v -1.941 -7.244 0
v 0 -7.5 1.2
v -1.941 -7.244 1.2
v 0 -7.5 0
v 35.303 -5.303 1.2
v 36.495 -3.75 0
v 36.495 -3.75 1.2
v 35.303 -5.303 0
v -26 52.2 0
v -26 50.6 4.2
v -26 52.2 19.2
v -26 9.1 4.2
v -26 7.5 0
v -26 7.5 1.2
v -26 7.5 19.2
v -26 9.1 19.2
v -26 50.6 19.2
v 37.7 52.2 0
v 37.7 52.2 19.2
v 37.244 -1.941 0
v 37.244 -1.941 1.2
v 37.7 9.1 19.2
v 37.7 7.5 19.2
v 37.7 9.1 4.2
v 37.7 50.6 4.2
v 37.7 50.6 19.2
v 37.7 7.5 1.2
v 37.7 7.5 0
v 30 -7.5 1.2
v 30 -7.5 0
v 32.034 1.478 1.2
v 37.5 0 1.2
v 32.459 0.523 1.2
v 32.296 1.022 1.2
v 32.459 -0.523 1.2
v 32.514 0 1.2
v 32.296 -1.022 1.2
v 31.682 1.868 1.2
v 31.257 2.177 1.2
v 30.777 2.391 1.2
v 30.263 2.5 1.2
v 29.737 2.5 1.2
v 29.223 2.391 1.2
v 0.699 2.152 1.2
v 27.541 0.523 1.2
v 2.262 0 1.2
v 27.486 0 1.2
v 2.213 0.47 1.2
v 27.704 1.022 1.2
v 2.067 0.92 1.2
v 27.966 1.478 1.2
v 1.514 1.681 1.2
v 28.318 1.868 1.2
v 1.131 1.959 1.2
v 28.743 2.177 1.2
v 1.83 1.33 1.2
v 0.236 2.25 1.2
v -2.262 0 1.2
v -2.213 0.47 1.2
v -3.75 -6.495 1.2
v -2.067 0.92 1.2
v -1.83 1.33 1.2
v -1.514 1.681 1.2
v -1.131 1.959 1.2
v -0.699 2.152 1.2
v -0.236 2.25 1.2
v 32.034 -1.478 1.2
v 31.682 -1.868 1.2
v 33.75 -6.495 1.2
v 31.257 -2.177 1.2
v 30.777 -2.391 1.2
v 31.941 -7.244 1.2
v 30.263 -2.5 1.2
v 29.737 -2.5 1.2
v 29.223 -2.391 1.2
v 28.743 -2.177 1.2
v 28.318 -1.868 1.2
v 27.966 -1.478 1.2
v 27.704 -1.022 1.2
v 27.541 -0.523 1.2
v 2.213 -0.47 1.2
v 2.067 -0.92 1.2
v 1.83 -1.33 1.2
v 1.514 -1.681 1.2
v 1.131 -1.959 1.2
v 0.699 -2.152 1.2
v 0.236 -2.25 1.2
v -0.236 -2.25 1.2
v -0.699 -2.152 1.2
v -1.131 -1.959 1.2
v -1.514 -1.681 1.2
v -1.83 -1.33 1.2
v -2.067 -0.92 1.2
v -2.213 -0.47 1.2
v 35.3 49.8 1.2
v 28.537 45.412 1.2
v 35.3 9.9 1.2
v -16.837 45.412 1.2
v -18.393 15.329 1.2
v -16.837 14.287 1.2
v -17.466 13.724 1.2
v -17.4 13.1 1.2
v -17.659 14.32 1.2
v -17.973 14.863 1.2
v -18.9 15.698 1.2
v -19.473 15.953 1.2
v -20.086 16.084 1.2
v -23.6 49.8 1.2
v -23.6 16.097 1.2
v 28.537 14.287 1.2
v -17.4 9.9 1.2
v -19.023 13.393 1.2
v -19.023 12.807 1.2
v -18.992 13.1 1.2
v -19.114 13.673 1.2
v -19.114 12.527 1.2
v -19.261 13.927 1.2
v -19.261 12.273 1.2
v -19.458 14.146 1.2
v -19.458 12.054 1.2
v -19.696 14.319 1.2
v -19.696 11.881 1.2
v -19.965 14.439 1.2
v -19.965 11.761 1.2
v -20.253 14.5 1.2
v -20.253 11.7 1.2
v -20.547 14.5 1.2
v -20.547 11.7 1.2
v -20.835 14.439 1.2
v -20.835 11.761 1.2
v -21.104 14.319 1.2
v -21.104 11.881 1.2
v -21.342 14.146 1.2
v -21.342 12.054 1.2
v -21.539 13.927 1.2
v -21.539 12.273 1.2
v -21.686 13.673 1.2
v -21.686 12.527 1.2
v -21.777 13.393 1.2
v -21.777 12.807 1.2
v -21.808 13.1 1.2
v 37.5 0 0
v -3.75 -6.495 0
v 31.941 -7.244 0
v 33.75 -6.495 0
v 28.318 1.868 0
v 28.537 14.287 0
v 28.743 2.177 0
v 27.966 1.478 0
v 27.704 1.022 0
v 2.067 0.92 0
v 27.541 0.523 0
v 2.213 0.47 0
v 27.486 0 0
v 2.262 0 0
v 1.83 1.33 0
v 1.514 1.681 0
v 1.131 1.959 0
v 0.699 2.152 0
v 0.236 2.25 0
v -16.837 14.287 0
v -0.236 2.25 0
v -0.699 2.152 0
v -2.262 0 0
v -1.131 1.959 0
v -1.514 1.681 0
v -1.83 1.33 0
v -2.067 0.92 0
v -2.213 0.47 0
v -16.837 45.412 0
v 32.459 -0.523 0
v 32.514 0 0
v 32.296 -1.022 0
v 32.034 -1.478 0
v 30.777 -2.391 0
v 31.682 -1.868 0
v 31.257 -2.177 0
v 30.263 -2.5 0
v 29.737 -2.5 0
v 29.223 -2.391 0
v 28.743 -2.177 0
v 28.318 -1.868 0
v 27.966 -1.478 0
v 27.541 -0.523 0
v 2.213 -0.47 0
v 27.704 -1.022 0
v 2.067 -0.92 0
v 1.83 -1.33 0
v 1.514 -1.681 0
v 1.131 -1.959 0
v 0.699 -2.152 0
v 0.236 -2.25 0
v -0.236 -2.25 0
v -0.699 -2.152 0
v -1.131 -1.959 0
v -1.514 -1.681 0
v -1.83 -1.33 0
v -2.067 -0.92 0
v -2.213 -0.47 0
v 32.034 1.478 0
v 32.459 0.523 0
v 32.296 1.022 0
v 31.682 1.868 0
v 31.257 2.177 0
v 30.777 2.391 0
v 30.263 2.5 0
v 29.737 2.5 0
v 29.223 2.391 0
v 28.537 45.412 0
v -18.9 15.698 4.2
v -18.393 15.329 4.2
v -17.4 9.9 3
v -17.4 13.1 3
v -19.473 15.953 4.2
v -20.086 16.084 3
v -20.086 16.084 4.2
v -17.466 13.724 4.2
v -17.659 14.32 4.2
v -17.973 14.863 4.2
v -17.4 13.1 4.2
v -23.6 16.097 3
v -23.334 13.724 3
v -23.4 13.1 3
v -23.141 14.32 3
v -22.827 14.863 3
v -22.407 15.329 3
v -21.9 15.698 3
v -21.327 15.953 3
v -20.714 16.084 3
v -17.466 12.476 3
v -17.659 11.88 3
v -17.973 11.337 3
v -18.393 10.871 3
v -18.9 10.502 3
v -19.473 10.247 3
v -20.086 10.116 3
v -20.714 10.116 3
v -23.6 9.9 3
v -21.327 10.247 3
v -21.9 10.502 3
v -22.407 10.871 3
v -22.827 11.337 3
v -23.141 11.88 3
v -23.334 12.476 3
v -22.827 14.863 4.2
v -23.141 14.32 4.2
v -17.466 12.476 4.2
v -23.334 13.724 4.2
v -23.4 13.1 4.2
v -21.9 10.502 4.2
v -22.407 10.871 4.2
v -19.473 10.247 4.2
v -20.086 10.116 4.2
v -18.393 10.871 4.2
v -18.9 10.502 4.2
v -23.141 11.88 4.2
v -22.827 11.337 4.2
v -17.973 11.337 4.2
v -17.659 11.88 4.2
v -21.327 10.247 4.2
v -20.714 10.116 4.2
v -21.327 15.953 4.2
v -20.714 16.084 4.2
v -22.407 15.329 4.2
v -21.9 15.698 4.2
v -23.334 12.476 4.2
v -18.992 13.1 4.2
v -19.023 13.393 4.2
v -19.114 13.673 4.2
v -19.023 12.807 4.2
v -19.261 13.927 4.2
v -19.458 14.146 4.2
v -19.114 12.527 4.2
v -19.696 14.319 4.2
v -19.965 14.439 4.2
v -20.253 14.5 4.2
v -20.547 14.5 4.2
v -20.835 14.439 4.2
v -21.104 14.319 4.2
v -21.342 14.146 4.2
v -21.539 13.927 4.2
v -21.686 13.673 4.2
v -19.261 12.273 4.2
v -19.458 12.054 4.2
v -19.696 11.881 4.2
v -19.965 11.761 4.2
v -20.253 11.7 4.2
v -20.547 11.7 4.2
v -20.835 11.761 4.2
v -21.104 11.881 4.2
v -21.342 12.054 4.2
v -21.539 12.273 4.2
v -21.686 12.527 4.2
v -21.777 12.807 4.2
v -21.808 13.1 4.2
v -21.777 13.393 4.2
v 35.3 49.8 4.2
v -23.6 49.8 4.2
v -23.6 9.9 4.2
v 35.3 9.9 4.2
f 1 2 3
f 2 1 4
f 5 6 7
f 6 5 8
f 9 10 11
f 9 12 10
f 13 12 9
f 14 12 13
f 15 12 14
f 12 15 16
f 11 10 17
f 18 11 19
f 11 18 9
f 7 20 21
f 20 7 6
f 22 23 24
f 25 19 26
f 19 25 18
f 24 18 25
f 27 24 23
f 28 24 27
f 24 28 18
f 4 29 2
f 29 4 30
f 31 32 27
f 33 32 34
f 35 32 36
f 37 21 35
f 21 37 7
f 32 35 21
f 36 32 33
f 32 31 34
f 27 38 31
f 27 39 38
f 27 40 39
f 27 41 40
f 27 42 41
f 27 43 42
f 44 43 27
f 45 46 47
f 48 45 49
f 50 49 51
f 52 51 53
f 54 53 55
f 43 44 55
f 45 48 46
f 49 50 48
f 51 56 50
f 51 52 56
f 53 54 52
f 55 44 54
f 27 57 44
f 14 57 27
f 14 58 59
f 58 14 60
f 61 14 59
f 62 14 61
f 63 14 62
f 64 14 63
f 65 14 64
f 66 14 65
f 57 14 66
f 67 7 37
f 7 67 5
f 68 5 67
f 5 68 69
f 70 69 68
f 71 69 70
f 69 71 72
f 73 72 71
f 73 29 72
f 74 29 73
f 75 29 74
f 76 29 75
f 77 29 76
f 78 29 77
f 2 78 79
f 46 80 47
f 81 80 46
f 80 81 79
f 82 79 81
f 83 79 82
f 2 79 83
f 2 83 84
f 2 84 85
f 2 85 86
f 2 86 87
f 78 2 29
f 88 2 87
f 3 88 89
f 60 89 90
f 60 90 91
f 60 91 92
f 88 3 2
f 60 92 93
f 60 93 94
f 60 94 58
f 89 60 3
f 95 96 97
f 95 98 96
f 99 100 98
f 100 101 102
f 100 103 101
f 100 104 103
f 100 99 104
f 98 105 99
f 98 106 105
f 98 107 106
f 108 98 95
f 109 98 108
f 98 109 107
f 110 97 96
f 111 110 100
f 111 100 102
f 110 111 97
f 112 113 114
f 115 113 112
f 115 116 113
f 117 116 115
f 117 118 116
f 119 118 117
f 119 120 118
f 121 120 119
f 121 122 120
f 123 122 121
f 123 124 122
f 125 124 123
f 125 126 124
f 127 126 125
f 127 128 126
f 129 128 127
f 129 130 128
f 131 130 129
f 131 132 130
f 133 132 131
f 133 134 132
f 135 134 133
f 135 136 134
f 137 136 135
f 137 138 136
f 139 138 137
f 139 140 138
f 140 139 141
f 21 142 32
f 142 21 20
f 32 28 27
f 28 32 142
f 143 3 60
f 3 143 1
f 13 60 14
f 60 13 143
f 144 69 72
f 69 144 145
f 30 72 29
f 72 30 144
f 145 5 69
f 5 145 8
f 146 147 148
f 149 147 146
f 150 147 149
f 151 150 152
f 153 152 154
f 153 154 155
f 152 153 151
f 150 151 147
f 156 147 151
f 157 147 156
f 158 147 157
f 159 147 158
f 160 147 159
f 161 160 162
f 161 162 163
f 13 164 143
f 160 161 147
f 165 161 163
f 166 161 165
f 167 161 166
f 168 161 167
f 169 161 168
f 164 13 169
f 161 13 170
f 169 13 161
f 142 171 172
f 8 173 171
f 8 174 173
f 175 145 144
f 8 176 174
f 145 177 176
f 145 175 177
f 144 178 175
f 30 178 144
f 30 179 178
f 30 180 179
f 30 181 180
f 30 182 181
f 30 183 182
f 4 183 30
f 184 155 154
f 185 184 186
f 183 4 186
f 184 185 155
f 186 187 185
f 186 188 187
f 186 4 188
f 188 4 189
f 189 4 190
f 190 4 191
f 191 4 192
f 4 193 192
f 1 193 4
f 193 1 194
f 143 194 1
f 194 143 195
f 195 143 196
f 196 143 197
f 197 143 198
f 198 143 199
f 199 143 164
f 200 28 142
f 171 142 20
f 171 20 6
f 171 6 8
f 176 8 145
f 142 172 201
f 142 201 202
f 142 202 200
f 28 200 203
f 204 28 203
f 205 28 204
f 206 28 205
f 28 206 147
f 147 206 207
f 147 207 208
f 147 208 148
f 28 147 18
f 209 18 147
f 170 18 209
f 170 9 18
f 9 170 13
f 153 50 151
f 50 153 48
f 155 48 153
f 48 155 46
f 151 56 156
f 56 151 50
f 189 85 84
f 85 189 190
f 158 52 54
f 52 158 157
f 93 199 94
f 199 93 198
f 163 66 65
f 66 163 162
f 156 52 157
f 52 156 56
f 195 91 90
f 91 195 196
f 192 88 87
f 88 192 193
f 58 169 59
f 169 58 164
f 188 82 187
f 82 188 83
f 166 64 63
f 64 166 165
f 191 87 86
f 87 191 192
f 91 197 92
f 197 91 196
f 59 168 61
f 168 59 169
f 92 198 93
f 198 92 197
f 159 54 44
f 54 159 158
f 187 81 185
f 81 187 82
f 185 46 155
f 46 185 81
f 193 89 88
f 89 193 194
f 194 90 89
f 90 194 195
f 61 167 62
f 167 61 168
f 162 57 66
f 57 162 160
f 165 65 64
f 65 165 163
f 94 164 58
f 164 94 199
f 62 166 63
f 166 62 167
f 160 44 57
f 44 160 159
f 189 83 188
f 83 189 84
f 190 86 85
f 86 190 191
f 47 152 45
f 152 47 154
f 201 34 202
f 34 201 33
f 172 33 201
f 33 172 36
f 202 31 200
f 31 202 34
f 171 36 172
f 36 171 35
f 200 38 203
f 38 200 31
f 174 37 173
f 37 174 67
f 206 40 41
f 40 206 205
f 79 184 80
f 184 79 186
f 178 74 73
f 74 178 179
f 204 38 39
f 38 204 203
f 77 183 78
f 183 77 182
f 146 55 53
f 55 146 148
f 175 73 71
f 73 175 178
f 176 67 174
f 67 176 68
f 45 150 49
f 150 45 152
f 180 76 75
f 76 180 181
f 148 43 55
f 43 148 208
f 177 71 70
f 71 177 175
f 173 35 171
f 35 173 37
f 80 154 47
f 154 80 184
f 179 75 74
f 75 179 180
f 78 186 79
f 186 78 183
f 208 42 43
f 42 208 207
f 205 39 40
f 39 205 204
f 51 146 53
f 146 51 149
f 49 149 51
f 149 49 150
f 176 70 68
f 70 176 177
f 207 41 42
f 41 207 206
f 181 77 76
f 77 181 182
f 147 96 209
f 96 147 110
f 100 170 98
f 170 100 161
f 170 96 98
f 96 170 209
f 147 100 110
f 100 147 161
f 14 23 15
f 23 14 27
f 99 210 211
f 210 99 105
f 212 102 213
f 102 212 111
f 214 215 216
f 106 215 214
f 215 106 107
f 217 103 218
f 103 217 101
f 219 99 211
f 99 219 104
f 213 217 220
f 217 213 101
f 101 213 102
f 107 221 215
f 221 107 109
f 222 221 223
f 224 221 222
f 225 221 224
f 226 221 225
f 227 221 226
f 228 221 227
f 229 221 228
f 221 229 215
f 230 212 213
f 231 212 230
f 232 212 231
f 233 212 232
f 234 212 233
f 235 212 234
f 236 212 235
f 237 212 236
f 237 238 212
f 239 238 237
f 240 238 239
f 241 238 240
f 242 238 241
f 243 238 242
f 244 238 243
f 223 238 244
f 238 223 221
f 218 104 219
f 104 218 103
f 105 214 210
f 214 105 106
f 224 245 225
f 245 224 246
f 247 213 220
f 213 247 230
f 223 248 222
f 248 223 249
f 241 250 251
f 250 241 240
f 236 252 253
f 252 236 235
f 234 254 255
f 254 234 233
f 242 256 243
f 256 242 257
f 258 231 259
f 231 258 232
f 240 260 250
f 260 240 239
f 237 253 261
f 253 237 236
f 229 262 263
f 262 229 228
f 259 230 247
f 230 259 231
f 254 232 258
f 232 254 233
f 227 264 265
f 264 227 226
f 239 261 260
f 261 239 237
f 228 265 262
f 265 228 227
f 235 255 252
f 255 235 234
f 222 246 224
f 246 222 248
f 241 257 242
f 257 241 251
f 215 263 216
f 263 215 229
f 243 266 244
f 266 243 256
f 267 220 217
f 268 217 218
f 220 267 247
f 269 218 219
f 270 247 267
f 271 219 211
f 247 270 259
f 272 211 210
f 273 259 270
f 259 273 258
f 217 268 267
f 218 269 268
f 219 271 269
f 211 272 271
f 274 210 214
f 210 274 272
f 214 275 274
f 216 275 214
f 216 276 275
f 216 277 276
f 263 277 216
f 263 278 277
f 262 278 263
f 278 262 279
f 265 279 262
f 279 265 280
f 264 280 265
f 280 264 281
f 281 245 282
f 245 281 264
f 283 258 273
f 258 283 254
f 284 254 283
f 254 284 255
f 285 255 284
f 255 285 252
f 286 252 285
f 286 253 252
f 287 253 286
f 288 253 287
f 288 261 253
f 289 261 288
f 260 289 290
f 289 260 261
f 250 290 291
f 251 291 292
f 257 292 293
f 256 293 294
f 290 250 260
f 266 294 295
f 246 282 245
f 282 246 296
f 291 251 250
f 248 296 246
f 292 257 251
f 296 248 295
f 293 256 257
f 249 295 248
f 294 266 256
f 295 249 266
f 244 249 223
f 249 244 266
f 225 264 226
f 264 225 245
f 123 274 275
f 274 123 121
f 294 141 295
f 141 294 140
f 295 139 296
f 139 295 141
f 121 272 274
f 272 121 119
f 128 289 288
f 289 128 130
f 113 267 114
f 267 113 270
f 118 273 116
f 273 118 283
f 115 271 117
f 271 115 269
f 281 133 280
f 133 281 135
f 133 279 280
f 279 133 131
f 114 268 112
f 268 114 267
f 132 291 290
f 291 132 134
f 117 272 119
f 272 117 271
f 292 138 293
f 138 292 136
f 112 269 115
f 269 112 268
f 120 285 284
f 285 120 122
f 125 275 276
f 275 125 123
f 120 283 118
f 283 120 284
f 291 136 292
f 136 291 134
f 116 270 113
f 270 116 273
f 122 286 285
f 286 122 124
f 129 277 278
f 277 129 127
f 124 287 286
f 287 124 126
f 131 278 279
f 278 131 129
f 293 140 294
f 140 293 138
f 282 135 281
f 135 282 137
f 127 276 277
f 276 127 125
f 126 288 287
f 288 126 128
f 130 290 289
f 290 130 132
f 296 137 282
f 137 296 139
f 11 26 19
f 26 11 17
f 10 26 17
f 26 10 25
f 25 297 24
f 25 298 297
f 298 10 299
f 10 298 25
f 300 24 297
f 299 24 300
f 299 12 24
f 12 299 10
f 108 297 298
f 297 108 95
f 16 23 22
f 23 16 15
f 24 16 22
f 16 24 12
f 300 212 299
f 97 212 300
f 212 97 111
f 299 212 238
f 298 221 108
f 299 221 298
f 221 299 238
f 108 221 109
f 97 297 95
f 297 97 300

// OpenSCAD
// Common
base_thickness = 1.2;

// Hole 1 (Always created)
hole_1_diameter = 4.5;
hole_1_support_diameter = 15;

// Hole 2 (Created if offsets != 0)
hole_2_diameter = 5;
hole_2_support_diameter = 15;
hole_2_offset_x = 30;
hole_2_offset_y = 0;

// Hole 3 (Created if offsets != 0)
hole_3_diameter = 5;
hole_3_support_diameter = 15;
hole_3_offset_x = 0;
hole_3_offset_y = 0;

// Hole 4 (Created if offsets != 0)
hole_4_diameter = 5;
hole_4_support_diameter = 15;
hole_4_offset_x = 0;
hole_4_offset_y = 0;

// Chip parameters
chip_offset_x = -26;
chip_offset_y = 7.5;
chip_rotation = 0;  // [0:0, 90:90, 180:180, 270:270]
wall_thickness = 1.6;
chip_length = 60.5;
chip_width = 41.5;
chip_height = 18;
riser_height = 3;
riser_width = 0.8;
mount_top = 1;  // [0:No, 1:Yes]
mount_bottom = 1;  // [0:No, 1:Yes]
mount_left = 0;  // [0:No, 1:Yes]
mount_right = 0;  // [0:No, 1:Yes]
riser_top = 1;  // [0:No, 1:Yes]
riser_bottom = 1;  // [0:No, 1:Yes]
riser_left = 1;  // [0:No, 1:Yes]
riser_right = 1;  // [0:No, 1:Yes]
lighten_mount = 1;  // [0:No, 1:Yes]
dual_mount = 0;  // [0:No, 1:Yes]
bottom_left_hole = 1;  // [0:No, 1:Yes]
bl_hole_x = 4;
bl_hole_y = 4;
bl_hole_diameter = 2.8;
bl_hole_thickness = 1.6;


module hole(radius, thickness){
  fn = 30;
  fudge = 1 / cos(180 / fn);
  translate([0, 0, -thickness*0.01]) {
    cylinder(h=thickness * 1.02, r=radius * fudge, $fn=fn);
  }
}


module chip_mount(length, width, height, base_thickness, wall_thickness,
                  riser_width, riser_height,
                  mount_top, riser_top, mount_bottom, riser_bottom,
                  mount_left, riser_left, mount_right, riser_right, lighten,
                  bottom_left_hole, bl_hole_x, bl_hole_y, bl_hole_diameter,
                  bl_hole_thickness) {
  // Mount base
  difference() {
    cube([length + 2 * wall_thickness,
          width + 2 * wall_thickness,
          base_thickness]);
    if (lighten) {
      translate([wall_thickness + length * 0.125,
                 wall_thickness + width * 0.125,
                 -base_thickness * 0.1]) {
        cube([length * 0.75, width * 0.75, base_thickness * 1.2]);
      }
    }
  }
  // Mount top
  if (mount_top) {
    translate([0, wall_thickness + width, base_thickness]) {
      cube([length + 2 * wall_thickness, wall_thickness, height]);
    }
  }
  // Riser top
  if (riser_top) {
    translate([0, wall_thickness + width - riser_width, base_thickness]) {
      cube([length + 2 * wall_thickness,
            wall_thickness + riser_width,
            riser_height]);
    }
  }
  // Mount bottom
  if (mount_bottom) {
    cube([length + 2 * wall_thickness, wall_thickness, base_thickness + height]);
  }
  // Riser bottom
  if (riser_bottom) {
    cube([length + 2 * wall_thickness,
          wall_thickness + riser_width,
          base_thickness + riser_height]);
  }
  // Mount left
  if (mount_left) {
    cube([wall_thickness,
          width + 2 * wall_thickness,
          base_thickness + height]);
  }
  // Riser left
  if (riser_left) {
    cube([wall_thickness + riser_width,
          width + 2 * wall_thickness,
          base_thickness + riser_height]);
  }
  // Mount right
  if (mount_right) {
    translate([wall_thickness + length, 0, 0]) {
      cube([wall_thickness, width + 2 * wall_thickness, base_thickness + height]);
    }
  }
  // Riser right
  if (riser_right) {
    translate([wall_thickness + length - riser_width, 0, 0]) {
      cube([wall_thickness + riser_width,
            width + 2 * wall_thickness,
            base_thickness + riser_height]);
    }
  }
  // Bottom left hole
  if (bottom_left_hole) {
    bl_inner_radius = bl_hole_diameter * 0.5;
    bl_outer_radius = bl_inner_radius + bl_hole_thickness;
    support_height =
        (bl_hole_x < 6 && bl_hole_y < 6) ? riser_height : base_thickness;
    difference() {
      union() {
        hull() {
          cube([wall_thickness + bl_hole_x + bl_outer_radius,
                wall_thickness,
                support_height]);
          cube([wall_thickness,
                wall_thickness + bl_hole_y + bl_outer_radius,
                support_height]);
          translate([wall_thickness + bl_hole_x,
                     wall_thickness + bl_hole_y,
                     0]) {
            cylinder(r=bl_outer_radius, h=support_height, $fn=30);
          }
        }
        translate([wall_thickness + bl_hole_x, wall_thickness + bl_hole_y, 0]) {
          cylinder(r=bl_outer_radius, h=riser_height + base_thickness, $fn=30);
        }
      }
      translate([wall_thickness + bl_hole_x, wall_thickness + bl_hole_y, 0]) {
        hole(bl_inner_radius, riser_height + base_thickness);
      }
    }
    // Fill in the bottom of the hole
    translate([wall_thickness + bl_hole_x, wall_thickness + bl_hole_y, 0]) {
      cylinder(r=bl_outer_radius, h=base_thickness, $fn=30);
    }
  }
}


hole_2 = (hole_2_offset_x != 0) || (hole_2_offset_y != 0);
echo("hole_2",hole_2);
hole_3 = (hole_3_offset_x != 0) || (hole_3_offset_y != 0);
echo("hole_3",hole_3);
hole_4 = (hole_4_offset_x != 0) || (hole_4_offset_y != 0);
echo("hole_4",hole_4);
mount_width =
  2.0 * wall_thickness + ((chip_rotation % 180) ? chip_width : chip_length);
echo("mount_width",mount_width);
mount_height =
  2.0 * wall_thickness + ((chip_rotation % 180) ? chip_length : chip_width);
echo("mount_height",mount_height);
mod_offset_x = chip_offset_x +
  ((chip_rotation == 90 || chip_rotation == 180) ? mount_width : 0.0);
echo("mod_offset_x", mod_offset_x);
mod_offset_y = chip_offset_y + ((chip_rotation >= 180) ? mount_height : 0);
echo("mod_offset_y", mod_offset_y);


difference() {
  // Main mount
  hull() {
    // Mount-1
    cylinder(h=base_thickness, d=hole_1_support_diameter);
    // Mount-2
    if (hole_2) {
      translate([hole_2_offset_x, hole_2_offset_y, 0]) {
        cylinder(h=base_thickness, d=hole_2_support_diameter);
      }
    }
    // Mount-3
    if (hole_3) {
      translate([hole_3_offset_x, hole_3_offset_y, 0]) {
        cylinder(h=base_thickness, d=hole_3_support_diameter);
      }
    }
    // Mount-4
    if (hole_4) {
      translate([hole_4_offset_x, hole_4_offset_y, 0]) {
        cylinder(h=base_thickness, d=hole_4_support_diameter);
      }
    }
    // Mount offset
    translate([chip_offset_x, chip_offset_y, 0]) {
      cube([mount_width, mount_height, base_thickness]);
    }
  }  // End hull
  // Hole-1
  hole(hole_1_diameter * 0.5, base_thickness, $fn);
  // Hole-2
  if (hole_2) {
    translate([hole_2_offset_x, hole_2_offset_y, 0]) {
      hole(hole_2_diameter * 0.5, base_thickness, $fn);
    }
  }
  // Hole-3
  if (hole_3) {
    translate([hole_3_offset_x, hole_3_offset_y, 0]) {
      hole(hole_3_diameter * 0.5, base_thickness, $fn);
    }
  }
  // Hole-4
  if (hole_4) {
    translate([hole_4_offset_x, hole_4_offset_y, 0]) {
      hole(hole_4_diameter * 0.5, base_thickness, $fn);
    }
  }
  if (lighten_mount) {
    translate([chip_offset_x + wall_thickness + (mount_width - 2 * wall_thickness) * 0.125,
               chip_offset_y + wall_thickness + (mount_height - 2 * wall_thickness) * 0.125,
               -base_thickness * 0.1]) {
      cube([(mount_width - 2 * wall_thickness) * 0.75,
            (mount_height - 2 * wall_thickness) * 0.75,
            base_thickness * 1.2]);
    }
  }
}  // End base plate

translate([mod_offset_x, mod_offset_y, 0]) {
  rotate([0, 0, chip_rotation])
    chip_mount(chip_length, chip_width, chip_height, base_thickness,
               wall_thickness, riser_width, riser_height,
               mount_top, riser_top, mount_bottom, riser_bottom,
               mount_left, riser_left, mount_right, riser_right, lighten_mount,
               bottom_left_hole, bl_hole_x, bl_hole_y, bl_hole_diameter,
               bl_hole_thickness);
}
